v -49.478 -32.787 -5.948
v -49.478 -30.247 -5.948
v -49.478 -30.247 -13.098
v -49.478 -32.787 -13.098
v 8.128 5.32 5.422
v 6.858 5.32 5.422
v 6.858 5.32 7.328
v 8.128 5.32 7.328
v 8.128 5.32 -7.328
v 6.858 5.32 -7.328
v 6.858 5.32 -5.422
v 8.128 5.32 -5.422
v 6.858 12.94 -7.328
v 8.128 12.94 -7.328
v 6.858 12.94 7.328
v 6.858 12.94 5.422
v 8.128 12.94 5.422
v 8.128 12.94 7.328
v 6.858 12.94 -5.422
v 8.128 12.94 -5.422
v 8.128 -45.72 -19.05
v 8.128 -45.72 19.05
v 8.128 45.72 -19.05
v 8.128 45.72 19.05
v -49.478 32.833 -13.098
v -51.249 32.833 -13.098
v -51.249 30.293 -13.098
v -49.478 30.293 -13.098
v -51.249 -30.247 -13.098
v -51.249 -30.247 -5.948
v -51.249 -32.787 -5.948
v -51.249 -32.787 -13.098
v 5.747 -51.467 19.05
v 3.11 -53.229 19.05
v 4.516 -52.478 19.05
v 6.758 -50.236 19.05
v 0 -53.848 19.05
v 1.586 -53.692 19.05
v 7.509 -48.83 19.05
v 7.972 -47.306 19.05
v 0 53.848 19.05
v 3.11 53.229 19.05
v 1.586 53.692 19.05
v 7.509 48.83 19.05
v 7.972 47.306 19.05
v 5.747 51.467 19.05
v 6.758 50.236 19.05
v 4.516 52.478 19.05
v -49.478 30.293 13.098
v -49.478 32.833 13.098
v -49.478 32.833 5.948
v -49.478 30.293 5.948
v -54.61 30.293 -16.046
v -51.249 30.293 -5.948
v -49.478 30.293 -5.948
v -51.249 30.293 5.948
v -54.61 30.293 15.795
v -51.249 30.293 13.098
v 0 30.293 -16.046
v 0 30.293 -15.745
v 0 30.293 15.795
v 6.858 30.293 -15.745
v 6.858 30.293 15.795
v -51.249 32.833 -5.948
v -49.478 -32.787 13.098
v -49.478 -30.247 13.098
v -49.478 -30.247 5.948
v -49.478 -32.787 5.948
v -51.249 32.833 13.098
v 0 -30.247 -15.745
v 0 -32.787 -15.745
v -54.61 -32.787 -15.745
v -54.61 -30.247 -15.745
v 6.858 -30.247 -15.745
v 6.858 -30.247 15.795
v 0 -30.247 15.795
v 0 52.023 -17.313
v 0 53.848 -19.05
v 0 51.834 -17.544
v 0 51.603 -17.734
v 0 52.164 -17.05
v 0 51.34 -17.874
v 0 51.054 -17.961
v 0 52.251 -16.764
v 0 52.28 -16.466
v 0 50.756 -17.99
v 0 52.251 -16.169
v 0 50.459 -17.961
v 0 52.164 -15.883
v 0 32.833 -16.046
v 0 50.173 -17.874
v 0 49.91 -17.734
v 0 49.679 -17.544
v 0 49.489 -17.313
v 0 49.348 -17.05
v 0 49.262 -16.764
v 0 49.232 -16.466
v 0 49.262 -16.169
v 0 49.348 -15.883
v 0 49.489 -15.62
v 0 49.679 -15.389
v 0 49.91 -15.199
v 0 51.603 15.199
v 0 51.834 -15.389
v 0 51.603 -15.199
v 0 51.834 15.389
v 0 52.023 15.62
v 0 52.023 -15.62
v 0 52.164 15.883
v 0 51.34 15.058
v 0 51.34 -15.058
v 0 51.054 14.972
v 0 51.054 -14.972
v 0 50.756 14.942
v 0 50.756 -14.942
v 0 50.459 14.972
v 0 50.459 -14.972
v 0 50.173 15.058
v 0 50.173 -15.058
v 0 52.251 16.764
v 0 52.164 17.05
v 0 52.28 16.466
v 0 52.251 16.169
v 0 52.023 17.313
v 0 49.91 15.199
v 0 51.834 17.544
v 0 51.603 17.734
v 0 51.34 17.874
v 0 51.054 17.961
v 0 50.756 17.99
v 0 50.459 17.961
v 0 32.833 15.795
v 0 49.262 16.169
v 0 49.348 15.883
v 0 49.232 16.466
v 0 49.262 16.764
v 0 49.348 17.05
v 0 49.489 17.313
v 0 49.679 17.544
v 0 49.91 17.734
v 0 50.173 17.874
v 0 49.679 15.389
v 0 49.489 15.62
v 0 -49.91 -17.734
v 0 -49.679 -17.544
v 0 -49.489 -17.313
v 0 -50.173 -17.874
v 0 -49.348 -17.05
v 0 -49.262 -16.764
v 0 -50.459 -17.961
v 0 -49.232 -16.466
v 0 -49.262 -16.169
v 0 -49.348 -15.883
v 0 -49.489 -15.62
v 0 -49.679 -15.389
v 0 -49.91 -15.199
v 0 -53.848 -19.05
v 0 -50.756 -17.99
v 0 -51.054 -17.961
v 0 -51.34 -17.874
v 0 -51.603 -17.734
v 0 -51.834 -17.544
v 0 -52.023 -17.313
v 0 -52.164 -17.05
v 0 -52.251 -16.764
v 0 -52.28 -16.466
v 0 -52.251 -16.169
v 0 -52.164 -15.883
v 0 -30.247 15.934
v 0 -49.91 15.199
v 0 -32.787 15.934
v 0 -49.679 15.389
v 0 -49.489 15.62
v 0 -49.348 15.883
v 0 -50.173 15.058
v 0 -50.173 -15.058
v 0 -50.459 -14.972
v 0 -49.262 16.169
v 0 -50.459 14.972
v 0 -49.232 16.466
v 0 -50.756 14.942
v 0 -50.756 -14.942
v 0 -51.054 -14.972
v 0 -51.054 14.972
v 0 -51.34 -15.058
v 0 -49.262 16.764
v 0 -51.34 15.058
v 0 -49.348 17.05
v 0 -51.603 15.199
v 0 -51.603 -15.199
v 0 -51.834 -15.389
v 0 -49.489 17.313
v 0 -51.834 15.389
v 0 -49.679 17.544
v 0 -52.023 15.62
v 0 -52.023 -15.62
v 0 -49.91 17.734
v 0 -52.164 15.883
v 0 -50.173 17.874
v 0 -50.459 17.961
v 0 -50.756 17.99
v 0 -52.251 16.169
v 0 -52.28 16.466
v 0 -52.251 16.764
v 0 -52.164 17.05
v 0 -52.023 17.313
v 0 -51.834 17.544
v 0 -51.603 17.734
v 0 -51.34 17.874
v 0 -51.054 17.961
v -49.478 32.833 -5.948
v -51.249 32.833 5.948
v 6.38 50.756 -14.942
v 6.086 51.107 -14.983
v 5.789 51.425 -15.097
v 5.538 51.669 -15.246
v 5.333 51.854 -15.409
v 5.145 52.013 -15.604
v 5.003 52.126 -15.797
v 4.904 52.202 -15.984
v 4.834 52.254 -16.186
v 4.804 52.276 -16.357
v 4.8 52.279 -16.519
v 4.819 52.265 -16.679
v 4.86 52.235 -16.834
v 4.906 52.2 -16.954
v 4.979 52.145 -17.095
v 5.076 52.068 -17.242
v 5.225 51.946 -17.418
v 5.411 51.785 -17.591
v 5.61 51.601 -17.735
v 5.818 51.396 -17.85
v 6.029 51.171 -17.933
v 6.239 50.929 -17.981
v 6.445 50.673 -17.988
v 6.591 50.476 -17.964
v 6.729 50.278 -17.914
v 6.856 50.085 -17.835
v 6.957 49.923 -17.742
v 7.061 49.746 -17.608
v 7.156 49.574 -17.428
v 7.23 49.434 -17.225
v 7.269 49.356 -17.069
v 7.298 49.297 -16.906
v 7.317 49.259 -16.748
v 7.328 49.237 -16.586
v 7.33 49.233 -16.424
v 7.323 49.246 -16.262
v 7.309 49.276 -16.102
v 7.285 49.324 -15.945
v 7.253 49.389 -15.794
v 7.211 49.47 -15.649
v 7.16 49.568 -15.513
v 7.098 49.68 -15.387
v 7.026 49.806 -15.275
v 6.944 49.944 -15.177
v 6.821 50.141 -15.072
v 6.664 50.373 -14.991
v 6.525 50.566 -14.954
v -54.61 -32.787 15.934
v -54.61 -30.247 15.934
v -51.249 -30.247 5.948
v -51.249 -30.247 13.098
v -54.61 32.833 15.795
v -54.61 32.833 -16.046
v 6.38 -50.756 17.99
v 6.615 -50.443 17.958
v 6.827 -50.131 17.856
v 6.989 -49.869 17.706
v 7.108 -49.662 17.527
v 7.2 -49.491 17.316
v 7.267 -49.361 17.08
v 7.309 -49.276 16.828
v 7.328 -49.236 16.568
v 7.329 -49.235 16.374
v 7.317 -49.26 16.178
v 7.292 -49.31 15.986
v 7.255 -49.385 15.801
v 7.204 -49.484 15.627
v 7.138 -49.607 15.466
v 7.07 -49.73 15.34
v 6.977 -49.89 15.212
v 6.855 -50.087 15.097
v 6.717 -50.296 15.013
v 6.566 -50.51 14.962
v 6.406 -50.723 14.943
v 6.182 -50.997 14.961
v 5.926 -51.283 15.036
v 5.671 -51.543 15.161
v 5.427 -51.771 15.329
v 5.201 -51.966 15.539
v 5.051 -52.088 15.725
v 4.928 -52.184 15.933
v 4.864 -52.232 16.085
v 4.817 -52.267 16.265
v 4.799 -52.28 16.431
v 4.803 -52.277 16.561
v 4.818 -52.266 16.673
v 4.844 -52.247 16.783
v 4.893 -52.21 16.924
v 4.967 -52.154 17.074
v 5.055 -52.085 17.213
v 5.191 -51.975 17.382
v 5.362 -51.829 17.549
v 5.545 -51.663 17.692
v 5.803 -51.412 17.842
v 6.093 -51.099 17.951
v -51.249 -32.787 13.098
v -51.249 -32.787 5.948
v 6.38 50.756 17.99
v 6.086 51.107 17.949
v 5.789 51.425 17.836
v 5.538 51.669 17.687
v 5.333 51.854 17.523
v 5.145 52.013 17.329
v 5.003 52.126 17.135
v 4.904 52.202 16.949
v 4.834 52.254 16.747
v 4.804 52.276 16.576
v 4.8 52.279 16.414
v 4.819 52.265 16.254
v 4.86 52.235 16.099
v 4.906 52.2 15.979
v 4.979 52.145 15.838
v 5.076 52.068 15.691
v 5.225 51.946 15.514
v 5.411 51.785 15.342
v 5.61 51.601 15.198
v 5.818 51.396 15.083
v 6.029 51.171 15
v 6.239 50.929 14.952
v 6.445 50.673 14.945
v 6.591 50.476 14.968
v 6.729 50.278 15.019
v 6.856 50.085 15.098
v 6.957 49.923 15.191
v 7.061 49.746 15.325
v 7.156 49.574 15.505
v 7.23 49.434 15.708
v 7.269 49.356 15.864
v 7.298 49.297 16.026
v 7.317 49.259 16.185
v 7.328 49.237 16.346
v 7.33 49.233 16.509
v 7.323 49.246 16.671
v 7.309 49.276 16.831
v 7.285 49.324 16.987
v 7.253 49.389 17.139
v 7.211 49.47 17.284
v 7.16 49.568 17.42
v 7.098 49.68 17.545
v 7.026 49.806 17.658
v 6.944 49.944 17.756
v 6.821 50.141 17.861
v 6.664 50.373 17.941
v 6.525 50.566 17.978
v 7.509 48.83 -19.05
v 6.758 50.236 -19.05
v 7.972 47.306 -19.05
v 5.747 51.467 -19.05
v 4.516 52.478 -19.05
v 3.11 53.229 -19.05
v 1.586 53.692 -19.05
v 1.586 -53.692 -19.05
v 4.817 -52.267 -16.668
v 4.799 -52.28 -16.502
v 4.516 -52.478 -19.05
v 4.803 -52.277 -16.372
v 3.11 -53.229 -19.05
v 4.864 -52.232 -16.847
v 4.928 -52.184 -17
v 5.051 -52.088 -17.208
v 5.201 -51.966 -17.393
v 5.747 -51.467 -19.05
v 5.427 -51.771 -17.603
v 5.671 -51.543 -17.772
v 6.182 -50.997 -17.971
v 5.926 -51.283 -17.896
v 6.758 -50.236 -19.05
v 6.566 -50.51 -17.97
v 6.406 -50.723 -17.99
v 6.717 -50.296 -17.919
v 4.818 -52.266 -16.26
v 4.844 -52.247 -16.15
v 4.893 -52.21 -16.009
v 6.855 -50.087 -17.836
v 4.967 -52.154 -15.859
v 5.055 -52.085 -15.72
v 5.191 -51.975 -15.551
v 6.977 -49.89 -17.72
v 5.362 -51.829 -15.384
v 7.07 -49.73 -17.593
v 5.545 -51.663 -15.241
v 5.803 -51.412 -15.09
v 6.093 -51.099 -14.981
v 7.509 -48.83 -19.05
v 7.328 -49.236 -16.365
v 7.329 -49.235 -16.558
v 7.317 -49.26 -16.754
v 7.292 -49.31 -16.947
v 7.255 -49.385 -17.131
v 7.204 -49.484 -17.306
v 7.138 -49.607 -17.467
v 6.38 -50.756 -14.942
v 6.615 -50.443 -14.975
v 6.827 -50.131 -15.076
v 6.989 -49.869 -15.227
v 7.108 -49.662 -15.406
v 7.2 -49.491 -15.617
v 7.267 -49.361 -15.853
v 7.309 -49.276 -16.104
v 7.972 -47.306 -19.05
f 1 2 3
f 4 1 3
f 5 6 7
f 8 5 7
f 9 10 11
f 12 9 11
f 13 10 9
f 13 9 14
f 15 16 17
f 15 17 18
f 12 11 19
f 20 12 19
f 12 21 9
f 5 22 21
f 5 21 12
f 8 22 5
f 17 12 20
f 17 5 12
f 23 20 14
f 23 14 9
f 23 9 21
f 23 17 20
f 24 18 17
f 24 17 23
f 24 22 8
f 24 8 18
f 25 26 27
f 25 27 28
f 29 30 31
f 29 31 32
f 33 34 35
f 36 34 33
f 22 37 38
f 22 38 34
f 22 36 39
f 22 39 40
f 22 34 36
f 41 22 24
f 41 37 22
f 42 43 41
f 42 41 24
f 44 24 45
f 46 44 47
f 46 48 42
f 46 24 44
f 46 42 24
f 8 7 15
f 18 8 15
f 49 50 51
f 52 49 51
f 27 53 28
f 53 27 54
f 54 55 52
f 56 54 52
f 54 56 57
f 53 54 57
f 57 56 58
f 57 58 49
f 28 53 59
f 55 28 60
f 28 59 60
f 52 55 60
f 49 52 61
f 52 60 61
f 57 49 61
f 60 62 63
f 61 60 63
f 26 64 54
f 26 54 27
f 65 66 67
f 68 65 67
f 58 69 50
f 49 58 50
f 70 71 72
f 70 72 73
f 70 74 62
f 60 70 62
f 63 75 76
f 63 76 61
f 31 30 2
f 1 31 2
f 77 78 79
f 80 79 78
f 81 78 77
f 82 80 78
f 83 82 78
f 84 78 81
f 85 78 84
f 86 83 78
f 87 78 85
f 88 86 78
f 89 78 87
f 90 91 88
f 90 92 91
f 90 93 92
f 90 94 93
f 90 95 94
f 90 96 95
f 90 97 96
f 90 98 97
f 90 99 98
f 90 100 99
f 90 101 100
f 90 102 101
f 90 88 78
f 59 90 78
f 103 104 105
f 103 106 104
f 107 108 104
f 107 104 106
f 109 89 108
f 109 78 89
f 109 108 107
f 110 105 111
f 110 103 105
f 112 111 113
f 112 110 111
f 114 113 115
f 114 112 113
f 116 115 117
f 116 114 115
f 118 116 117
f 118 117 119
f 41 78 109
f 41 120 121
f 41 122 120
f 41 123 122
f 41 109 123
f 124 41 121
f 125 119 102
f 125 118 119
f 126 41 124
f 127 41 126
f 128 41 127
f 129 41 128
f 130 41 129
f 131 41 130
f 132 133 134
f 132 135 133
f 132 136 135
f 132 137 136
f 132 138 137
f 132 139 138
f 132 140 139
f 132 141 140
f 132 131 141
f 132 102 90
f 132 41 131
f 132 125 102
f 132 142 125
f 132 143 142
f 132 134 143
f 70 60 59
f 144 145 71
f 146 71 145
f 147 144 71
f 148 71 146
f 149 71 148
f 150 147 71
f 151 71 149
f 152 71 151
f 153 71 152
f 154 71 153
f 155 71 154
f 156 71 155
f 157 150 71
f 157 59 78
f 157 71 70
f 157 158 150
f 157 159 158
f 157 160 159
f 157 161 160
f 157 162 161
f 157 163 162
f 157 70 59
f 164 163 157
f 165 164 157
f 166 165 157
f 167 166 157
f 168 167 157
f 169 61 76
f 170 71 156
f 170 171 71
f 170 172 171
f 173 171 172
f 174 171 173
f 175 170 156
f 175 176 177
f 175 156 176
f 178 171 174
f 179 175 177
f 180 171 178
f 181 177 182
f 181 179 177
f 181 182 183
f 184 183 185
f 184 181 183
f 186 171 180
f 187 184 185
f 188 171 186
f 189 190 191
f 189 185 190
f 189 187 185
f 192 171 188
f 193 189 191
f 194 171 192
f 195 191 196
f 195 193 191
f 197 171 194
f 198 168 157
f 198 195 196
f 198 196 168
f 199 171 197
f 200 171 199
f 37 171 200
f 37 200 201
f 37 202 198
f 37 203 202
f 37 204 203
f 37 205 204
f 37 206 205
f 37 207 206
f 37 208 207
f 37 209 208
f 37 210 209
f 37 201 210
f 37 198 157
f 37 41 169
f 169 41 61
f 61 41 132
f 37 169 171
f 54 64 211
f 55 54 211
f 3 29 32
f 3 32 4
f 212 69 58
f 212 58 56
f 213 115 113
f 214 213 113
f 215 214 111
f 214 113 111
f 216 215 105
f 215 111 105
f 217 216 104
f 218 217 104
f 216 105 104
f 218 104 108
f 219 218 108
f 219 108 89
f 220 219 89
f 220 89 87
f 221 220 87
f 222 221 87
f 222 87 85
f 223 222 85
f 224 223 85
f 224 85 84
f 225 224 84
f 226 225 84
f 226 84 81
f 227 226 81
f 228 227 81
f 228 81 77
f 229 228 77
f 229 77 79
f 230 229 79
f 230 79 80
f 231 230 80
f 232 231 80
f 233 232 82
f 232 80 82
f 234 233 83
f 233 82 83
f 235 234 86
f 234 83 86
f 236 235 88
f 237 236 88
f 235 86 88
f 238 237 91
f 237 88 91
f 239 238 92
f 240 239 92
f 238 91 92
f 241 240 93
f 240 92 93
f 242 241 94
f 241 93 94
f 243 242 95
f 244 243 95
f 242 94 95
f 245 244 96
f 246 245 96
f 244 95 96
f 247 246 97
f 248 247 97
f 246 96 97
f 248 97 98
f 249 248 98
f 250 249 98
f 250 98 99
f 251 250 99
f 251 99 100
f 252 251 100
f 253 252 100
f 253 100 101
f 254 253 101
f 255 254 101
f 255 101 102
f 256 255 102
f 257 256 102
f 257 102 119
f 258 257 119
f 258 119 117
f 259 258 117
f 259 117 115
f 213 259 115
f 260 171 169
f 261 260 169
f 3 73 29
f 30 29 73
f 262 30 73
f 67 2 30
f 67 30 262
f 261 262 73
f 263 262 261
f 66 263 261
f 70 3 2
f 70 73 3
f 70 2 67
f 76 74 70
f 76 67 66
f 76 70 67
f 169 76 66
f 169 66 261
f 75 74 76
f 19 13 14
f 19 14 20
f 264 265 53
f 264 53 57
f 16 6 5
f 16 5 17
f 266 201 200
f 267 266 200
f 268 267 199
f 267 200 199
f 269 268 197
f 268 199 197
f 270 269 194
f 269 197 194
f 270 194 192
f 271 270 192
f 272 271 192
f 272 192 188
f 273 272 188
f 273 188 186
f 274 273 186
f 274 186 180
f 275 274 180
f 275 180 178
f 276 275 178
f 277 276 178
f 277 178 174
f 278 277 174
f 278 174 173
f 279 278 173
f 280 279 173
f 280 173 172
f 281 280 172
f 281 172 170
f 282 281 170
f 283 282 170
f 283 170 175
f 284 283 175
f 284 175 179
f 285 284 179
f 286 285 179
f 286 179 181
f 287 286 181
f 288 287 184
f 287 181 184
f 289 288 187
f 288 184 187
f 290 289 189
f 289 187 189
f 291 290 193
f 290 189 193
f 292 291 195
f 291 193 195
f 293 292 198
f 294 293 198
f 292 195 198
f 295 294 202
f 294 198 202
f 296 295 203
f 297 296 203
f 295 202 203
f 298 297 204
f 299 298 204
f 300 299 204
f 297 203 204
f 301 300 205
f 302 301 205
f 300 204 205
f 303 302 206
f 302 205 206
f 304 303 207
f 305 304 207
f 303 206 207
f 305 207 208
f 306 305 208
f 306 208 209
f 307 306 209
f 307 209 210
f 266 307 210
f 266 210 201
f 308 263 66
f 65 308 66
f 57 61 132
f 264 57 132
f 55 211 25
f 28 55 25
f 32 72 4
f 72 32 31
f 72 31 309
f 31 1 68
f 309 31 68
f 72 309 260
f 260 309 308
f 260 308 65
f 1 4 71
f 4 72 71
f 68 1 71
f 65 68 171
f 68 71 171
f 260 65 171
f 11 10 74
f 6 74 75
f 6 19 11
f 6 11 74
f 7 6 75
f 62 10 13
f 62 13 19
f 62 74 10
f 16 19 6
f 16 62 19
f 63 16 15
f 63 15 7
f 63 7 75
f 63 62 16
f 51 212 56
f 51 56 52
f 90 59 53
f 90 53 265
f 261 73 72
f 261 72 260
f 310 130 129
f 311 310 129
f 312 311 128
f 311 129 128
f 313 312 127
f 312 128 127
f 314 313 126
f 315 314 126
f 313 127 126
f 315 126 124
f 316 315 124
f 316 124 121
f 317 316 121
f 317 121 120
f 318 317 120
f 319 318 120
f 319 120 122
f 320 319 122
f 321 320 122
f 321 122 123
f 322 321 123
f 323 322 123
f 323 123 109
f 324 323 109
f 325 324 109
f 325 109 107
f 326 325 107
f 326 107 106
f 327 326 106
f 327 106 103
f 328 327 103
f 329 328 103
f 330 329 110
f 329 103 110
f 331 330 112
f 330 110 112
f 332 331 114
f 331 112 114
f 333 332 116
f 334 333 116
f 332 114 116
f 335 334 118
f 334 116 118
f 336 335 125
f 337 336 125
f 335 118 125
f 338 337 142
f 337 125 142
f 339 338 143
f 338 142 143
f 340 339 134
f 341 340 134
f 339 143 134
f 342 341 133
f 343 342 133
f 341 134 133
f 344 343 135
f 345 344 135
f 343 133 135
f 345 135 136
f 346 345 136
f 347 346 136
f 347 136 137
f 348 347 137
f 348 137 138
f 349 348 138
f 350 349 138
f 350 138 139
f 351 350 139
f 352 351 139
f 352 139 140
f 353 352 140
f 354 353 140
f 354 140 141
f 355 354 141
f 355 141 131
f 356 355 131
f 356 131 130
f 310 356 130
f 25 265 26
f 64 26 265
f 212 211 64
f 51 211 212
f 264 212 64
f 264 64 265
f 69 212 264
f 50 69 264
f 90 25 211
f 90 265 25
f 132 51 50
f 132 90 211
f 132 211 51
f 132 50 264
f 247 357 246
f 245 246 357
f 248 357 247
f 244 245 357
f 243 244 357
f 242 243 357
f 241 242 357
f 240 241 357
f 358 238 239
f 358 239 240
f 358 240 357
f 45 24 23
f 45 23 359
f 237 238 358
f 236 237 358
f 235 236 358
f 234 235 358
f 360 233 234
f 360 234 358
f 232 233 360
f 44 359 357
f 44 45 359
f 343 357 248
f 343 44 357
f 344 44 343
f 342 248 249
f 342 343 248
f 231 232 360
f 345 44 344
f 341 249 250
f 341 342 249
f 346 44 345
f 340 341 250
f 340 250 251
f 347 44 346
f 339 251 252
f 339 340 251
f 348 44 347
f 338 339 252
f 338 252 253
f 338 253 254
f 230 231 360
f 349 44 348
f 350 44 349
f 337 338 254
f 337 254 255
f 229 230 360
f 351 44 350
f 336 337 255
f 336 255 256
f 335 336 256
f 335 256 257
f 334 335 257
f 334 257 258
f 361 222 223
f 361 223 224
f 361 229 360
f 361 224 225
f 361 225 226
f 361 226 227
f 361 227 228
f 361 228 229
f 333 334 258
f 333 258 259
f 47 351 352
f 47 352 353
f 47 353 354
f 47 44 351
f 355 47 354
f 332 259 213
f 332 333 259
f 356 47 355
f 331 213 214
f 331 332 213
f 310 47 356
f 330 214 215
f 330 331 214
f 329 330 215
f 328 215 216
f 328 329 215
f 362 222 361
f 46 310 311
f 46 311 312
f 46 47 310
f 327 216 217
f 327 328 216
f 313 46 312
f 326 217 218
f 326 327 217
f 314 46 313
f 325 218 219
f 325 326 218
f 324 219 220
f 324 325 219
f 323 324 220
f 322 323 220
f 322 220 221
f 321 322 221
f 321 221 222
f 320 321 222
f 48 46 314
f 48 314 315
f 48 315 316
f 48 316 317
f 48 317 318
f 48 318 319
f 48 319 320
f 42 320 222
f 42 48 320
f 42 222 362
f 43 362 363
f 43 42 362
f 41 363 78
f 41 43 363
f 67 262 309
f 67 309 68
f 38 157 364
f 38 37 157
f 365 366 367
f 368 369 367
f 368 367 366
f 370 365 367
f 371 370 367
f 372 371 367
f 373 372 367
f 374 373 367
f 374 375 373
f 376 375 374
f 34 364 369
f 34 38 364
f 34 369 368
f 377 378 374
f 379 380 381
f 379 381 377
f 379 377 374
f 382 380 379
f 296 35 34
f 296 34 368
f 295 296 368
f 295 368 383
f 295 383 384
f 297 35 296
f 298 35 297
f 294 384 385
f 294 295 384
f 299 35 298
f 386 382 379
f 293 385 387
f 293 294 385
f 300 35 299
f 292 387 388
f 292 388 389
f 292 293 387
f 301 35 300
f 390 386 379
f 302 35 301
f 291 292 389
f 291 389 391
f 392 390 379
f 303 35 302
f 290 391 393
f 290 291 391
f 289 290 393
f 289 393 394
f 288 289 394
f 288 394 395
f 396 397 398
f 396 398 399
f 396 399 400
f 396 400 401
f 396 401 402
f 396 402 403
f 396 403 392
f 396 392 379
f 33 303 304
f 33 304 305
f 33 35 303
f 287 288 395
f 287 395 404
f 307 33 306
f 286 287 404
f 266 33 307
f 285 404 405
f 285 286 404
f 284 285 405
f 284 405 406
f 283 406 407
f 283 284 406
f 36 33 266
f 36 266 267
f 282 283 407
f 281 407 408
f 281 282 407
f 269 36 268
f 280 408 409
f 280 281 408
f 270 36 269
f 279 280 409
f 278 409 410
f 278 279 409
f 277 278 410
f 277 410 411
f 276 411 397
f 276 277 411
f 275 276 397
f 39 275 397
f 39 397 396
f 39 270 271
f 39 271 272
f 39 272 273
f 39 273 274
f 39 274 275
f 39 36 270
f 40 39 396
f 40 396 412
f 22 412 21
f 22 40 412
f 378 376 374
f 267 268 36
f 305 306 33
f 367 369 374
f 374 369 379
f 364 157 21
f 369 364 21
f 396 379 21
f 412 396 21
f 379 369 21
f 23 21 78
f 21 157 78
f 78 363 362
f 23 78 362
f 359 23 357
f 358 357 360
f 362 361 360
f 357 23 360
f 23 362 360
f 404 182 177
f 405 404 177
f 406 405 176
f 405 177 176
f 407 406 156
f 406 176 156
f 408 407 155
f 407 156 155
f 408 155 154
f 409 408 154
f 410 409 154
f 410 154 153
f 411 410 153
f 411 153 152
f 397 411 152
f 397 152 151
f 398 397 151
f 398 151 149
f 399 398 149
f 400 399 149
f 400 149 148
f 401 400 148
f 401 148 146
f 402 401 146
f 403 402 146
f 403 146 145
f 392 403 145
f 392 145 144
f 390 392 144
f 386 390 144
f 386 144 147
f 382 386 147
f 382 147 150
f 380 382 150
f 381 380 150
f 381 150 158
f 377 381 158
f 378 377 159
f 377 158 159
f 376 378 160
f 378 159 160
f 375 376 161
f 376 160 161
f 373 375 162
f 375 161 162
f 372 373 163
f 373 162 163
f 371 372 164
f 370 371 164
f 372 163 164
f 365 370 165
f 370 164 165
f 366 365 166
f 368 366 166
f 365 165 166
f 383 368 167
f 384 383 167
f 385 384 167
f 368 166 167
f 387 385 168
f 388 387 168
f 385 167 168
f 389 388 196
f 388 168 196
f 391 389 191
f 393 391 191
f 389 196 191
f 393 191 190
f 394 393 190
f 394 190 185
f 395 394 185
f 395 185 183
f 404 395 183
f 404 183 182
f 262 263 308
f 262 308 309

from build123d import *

# Parameters (mm, degrees)
BOSS_EXTRUDE1_DEPTH     = 19.05
CUT_EXTRUDE4_DEPTH      = 0.508
CUT_EXTRUDE4_DEPTH_BACK = 6.858
SKETCH4_W               = 31.54
SKETCH4_H               = 60.54
SKETCH4_3_W             = 1.905
SKETCH4_3_H             = 7.62
CUT_EXTRUDE5_DEPTH      = 34.798
SKETCH5_W               = 31.679207877
SKETCH5_H               = 2.54
SKETCH5_W_2             = 31.841170495
BOSS_EXTRUDE2_DEPTH     = 54.61
SKETCH6_W               = 1.77119272
SKETCH6_H               = 7.149457174
CUT_EXTRUDE6_DEPTH      = 90.782
SKETCH4_5_R             = 1.524
CUT_EXTRUDE7_DEPTH      = 90.782


with BuildPart() as part:
    # Sketch2 → Boss-Extrude1 (new, symmetric)
    with BuildSketch(Plane.XY):
        with BuildLine():
            Line((8.128, -45.72), (8.128, 45.72))
            ThreePointArc((8.128, 45.72), (5.747363917, 51.467363917), (0, 53.848))
            Line((0, 53.848), (0, -53.848))
            ThreePointArc((0, -53.848), (5.747363917, -51.467363917), (8.128, -45.72))
        make_face()
    extrude(amount=BOSS_EXTRUDE1_DEPTH, both=True)

    # Sketch4 → Cut-Extrude4 (cut, two sides: drawn at the far end of the back side and taken through both)
    with BuildSketch(Plane.ZY.offset(-CUT_EXTRUDE4_DEPTH_BACK)):
        with Locations((0.025266364, 0.022760685)):
            Rectangle(SKETCH4_W, SKETCH4_H)
    extrude(amount=CUT_EXTRUDE4_DEPTH + CUT_EXTRUDE4_DEPTH_BACK, mode=Mode.SUBTRACT)

    # Sketch4<3> → Cut-Extrude5 (cut)
    with BuildSketch(Plane.ZY):
        with Locations((-6.375, 9.13)):
            Rectangle(SKETCH4_3_W, SKETCH4_3_H)
        with Locations((6.375, 9.13)):
            Rectangle(SKETCH4_3_W, SKETCH4_3_H)
    extrude(amount=-CUT_EXTRUDE5_DEPTH, mode=Mode.SUBTRACT)

    # Sketch5 → Boss-Extrude2 (add)
    with BuildSketch(Plane.ZY):
        with Locations((0.094870302, -31.517239315)):
            Rectangle(SKETCH5_W, SKETCH5_H)
        with Locations((-0.125318883, 31.562760685)):
            Rectangle(SKETCH5_W_2, SKETCH5_H)
    extrude(amount=BOSS_EXTRUDE2_DEPTH)

    # Sketch6 → Cut-Extrude6 (cut)
    with BuildSketch(Plane(origin=(0, 32.832760685, 0), x_dir=(1, 0, 0), z_dir=(0, 1, 0))):
        with Locations((-50.36366337, 9.522864257)):
            Rectangle(SKETCH6_W, SKETCH6_H)
        with Locations((-50.36366337, -9.522864257)):
            Rectangle(SKETCH6_W, SKETCH6_H)
    extrude(amount=-CUT_EXTRUDE6_DEPTH, mode=Mode.SUBTRACT)

    # Sketch4<5> → Cut-Extrude7 (cut)
    with BuildSketch(Plane.ZY):
        with Locations((-16.466357327, -50.756314804)):
            Circle(SKETCH4_5_R)
        with Locations((16.466357327, -50.756314804)):
            Circle(SKETCH4_5_R)
        with Locations((16.466357327, 50.756314804)):
            Circle(SKETCH4_5_R)
        with Locations((-16.466357327, 50.756314804)):
            Circle(SKETCH4_5_R)
    extrude(amount=-CUT_EXTRUDE7_DEPTH, mode=Mode.SUBTRACT)


solid = part.part
